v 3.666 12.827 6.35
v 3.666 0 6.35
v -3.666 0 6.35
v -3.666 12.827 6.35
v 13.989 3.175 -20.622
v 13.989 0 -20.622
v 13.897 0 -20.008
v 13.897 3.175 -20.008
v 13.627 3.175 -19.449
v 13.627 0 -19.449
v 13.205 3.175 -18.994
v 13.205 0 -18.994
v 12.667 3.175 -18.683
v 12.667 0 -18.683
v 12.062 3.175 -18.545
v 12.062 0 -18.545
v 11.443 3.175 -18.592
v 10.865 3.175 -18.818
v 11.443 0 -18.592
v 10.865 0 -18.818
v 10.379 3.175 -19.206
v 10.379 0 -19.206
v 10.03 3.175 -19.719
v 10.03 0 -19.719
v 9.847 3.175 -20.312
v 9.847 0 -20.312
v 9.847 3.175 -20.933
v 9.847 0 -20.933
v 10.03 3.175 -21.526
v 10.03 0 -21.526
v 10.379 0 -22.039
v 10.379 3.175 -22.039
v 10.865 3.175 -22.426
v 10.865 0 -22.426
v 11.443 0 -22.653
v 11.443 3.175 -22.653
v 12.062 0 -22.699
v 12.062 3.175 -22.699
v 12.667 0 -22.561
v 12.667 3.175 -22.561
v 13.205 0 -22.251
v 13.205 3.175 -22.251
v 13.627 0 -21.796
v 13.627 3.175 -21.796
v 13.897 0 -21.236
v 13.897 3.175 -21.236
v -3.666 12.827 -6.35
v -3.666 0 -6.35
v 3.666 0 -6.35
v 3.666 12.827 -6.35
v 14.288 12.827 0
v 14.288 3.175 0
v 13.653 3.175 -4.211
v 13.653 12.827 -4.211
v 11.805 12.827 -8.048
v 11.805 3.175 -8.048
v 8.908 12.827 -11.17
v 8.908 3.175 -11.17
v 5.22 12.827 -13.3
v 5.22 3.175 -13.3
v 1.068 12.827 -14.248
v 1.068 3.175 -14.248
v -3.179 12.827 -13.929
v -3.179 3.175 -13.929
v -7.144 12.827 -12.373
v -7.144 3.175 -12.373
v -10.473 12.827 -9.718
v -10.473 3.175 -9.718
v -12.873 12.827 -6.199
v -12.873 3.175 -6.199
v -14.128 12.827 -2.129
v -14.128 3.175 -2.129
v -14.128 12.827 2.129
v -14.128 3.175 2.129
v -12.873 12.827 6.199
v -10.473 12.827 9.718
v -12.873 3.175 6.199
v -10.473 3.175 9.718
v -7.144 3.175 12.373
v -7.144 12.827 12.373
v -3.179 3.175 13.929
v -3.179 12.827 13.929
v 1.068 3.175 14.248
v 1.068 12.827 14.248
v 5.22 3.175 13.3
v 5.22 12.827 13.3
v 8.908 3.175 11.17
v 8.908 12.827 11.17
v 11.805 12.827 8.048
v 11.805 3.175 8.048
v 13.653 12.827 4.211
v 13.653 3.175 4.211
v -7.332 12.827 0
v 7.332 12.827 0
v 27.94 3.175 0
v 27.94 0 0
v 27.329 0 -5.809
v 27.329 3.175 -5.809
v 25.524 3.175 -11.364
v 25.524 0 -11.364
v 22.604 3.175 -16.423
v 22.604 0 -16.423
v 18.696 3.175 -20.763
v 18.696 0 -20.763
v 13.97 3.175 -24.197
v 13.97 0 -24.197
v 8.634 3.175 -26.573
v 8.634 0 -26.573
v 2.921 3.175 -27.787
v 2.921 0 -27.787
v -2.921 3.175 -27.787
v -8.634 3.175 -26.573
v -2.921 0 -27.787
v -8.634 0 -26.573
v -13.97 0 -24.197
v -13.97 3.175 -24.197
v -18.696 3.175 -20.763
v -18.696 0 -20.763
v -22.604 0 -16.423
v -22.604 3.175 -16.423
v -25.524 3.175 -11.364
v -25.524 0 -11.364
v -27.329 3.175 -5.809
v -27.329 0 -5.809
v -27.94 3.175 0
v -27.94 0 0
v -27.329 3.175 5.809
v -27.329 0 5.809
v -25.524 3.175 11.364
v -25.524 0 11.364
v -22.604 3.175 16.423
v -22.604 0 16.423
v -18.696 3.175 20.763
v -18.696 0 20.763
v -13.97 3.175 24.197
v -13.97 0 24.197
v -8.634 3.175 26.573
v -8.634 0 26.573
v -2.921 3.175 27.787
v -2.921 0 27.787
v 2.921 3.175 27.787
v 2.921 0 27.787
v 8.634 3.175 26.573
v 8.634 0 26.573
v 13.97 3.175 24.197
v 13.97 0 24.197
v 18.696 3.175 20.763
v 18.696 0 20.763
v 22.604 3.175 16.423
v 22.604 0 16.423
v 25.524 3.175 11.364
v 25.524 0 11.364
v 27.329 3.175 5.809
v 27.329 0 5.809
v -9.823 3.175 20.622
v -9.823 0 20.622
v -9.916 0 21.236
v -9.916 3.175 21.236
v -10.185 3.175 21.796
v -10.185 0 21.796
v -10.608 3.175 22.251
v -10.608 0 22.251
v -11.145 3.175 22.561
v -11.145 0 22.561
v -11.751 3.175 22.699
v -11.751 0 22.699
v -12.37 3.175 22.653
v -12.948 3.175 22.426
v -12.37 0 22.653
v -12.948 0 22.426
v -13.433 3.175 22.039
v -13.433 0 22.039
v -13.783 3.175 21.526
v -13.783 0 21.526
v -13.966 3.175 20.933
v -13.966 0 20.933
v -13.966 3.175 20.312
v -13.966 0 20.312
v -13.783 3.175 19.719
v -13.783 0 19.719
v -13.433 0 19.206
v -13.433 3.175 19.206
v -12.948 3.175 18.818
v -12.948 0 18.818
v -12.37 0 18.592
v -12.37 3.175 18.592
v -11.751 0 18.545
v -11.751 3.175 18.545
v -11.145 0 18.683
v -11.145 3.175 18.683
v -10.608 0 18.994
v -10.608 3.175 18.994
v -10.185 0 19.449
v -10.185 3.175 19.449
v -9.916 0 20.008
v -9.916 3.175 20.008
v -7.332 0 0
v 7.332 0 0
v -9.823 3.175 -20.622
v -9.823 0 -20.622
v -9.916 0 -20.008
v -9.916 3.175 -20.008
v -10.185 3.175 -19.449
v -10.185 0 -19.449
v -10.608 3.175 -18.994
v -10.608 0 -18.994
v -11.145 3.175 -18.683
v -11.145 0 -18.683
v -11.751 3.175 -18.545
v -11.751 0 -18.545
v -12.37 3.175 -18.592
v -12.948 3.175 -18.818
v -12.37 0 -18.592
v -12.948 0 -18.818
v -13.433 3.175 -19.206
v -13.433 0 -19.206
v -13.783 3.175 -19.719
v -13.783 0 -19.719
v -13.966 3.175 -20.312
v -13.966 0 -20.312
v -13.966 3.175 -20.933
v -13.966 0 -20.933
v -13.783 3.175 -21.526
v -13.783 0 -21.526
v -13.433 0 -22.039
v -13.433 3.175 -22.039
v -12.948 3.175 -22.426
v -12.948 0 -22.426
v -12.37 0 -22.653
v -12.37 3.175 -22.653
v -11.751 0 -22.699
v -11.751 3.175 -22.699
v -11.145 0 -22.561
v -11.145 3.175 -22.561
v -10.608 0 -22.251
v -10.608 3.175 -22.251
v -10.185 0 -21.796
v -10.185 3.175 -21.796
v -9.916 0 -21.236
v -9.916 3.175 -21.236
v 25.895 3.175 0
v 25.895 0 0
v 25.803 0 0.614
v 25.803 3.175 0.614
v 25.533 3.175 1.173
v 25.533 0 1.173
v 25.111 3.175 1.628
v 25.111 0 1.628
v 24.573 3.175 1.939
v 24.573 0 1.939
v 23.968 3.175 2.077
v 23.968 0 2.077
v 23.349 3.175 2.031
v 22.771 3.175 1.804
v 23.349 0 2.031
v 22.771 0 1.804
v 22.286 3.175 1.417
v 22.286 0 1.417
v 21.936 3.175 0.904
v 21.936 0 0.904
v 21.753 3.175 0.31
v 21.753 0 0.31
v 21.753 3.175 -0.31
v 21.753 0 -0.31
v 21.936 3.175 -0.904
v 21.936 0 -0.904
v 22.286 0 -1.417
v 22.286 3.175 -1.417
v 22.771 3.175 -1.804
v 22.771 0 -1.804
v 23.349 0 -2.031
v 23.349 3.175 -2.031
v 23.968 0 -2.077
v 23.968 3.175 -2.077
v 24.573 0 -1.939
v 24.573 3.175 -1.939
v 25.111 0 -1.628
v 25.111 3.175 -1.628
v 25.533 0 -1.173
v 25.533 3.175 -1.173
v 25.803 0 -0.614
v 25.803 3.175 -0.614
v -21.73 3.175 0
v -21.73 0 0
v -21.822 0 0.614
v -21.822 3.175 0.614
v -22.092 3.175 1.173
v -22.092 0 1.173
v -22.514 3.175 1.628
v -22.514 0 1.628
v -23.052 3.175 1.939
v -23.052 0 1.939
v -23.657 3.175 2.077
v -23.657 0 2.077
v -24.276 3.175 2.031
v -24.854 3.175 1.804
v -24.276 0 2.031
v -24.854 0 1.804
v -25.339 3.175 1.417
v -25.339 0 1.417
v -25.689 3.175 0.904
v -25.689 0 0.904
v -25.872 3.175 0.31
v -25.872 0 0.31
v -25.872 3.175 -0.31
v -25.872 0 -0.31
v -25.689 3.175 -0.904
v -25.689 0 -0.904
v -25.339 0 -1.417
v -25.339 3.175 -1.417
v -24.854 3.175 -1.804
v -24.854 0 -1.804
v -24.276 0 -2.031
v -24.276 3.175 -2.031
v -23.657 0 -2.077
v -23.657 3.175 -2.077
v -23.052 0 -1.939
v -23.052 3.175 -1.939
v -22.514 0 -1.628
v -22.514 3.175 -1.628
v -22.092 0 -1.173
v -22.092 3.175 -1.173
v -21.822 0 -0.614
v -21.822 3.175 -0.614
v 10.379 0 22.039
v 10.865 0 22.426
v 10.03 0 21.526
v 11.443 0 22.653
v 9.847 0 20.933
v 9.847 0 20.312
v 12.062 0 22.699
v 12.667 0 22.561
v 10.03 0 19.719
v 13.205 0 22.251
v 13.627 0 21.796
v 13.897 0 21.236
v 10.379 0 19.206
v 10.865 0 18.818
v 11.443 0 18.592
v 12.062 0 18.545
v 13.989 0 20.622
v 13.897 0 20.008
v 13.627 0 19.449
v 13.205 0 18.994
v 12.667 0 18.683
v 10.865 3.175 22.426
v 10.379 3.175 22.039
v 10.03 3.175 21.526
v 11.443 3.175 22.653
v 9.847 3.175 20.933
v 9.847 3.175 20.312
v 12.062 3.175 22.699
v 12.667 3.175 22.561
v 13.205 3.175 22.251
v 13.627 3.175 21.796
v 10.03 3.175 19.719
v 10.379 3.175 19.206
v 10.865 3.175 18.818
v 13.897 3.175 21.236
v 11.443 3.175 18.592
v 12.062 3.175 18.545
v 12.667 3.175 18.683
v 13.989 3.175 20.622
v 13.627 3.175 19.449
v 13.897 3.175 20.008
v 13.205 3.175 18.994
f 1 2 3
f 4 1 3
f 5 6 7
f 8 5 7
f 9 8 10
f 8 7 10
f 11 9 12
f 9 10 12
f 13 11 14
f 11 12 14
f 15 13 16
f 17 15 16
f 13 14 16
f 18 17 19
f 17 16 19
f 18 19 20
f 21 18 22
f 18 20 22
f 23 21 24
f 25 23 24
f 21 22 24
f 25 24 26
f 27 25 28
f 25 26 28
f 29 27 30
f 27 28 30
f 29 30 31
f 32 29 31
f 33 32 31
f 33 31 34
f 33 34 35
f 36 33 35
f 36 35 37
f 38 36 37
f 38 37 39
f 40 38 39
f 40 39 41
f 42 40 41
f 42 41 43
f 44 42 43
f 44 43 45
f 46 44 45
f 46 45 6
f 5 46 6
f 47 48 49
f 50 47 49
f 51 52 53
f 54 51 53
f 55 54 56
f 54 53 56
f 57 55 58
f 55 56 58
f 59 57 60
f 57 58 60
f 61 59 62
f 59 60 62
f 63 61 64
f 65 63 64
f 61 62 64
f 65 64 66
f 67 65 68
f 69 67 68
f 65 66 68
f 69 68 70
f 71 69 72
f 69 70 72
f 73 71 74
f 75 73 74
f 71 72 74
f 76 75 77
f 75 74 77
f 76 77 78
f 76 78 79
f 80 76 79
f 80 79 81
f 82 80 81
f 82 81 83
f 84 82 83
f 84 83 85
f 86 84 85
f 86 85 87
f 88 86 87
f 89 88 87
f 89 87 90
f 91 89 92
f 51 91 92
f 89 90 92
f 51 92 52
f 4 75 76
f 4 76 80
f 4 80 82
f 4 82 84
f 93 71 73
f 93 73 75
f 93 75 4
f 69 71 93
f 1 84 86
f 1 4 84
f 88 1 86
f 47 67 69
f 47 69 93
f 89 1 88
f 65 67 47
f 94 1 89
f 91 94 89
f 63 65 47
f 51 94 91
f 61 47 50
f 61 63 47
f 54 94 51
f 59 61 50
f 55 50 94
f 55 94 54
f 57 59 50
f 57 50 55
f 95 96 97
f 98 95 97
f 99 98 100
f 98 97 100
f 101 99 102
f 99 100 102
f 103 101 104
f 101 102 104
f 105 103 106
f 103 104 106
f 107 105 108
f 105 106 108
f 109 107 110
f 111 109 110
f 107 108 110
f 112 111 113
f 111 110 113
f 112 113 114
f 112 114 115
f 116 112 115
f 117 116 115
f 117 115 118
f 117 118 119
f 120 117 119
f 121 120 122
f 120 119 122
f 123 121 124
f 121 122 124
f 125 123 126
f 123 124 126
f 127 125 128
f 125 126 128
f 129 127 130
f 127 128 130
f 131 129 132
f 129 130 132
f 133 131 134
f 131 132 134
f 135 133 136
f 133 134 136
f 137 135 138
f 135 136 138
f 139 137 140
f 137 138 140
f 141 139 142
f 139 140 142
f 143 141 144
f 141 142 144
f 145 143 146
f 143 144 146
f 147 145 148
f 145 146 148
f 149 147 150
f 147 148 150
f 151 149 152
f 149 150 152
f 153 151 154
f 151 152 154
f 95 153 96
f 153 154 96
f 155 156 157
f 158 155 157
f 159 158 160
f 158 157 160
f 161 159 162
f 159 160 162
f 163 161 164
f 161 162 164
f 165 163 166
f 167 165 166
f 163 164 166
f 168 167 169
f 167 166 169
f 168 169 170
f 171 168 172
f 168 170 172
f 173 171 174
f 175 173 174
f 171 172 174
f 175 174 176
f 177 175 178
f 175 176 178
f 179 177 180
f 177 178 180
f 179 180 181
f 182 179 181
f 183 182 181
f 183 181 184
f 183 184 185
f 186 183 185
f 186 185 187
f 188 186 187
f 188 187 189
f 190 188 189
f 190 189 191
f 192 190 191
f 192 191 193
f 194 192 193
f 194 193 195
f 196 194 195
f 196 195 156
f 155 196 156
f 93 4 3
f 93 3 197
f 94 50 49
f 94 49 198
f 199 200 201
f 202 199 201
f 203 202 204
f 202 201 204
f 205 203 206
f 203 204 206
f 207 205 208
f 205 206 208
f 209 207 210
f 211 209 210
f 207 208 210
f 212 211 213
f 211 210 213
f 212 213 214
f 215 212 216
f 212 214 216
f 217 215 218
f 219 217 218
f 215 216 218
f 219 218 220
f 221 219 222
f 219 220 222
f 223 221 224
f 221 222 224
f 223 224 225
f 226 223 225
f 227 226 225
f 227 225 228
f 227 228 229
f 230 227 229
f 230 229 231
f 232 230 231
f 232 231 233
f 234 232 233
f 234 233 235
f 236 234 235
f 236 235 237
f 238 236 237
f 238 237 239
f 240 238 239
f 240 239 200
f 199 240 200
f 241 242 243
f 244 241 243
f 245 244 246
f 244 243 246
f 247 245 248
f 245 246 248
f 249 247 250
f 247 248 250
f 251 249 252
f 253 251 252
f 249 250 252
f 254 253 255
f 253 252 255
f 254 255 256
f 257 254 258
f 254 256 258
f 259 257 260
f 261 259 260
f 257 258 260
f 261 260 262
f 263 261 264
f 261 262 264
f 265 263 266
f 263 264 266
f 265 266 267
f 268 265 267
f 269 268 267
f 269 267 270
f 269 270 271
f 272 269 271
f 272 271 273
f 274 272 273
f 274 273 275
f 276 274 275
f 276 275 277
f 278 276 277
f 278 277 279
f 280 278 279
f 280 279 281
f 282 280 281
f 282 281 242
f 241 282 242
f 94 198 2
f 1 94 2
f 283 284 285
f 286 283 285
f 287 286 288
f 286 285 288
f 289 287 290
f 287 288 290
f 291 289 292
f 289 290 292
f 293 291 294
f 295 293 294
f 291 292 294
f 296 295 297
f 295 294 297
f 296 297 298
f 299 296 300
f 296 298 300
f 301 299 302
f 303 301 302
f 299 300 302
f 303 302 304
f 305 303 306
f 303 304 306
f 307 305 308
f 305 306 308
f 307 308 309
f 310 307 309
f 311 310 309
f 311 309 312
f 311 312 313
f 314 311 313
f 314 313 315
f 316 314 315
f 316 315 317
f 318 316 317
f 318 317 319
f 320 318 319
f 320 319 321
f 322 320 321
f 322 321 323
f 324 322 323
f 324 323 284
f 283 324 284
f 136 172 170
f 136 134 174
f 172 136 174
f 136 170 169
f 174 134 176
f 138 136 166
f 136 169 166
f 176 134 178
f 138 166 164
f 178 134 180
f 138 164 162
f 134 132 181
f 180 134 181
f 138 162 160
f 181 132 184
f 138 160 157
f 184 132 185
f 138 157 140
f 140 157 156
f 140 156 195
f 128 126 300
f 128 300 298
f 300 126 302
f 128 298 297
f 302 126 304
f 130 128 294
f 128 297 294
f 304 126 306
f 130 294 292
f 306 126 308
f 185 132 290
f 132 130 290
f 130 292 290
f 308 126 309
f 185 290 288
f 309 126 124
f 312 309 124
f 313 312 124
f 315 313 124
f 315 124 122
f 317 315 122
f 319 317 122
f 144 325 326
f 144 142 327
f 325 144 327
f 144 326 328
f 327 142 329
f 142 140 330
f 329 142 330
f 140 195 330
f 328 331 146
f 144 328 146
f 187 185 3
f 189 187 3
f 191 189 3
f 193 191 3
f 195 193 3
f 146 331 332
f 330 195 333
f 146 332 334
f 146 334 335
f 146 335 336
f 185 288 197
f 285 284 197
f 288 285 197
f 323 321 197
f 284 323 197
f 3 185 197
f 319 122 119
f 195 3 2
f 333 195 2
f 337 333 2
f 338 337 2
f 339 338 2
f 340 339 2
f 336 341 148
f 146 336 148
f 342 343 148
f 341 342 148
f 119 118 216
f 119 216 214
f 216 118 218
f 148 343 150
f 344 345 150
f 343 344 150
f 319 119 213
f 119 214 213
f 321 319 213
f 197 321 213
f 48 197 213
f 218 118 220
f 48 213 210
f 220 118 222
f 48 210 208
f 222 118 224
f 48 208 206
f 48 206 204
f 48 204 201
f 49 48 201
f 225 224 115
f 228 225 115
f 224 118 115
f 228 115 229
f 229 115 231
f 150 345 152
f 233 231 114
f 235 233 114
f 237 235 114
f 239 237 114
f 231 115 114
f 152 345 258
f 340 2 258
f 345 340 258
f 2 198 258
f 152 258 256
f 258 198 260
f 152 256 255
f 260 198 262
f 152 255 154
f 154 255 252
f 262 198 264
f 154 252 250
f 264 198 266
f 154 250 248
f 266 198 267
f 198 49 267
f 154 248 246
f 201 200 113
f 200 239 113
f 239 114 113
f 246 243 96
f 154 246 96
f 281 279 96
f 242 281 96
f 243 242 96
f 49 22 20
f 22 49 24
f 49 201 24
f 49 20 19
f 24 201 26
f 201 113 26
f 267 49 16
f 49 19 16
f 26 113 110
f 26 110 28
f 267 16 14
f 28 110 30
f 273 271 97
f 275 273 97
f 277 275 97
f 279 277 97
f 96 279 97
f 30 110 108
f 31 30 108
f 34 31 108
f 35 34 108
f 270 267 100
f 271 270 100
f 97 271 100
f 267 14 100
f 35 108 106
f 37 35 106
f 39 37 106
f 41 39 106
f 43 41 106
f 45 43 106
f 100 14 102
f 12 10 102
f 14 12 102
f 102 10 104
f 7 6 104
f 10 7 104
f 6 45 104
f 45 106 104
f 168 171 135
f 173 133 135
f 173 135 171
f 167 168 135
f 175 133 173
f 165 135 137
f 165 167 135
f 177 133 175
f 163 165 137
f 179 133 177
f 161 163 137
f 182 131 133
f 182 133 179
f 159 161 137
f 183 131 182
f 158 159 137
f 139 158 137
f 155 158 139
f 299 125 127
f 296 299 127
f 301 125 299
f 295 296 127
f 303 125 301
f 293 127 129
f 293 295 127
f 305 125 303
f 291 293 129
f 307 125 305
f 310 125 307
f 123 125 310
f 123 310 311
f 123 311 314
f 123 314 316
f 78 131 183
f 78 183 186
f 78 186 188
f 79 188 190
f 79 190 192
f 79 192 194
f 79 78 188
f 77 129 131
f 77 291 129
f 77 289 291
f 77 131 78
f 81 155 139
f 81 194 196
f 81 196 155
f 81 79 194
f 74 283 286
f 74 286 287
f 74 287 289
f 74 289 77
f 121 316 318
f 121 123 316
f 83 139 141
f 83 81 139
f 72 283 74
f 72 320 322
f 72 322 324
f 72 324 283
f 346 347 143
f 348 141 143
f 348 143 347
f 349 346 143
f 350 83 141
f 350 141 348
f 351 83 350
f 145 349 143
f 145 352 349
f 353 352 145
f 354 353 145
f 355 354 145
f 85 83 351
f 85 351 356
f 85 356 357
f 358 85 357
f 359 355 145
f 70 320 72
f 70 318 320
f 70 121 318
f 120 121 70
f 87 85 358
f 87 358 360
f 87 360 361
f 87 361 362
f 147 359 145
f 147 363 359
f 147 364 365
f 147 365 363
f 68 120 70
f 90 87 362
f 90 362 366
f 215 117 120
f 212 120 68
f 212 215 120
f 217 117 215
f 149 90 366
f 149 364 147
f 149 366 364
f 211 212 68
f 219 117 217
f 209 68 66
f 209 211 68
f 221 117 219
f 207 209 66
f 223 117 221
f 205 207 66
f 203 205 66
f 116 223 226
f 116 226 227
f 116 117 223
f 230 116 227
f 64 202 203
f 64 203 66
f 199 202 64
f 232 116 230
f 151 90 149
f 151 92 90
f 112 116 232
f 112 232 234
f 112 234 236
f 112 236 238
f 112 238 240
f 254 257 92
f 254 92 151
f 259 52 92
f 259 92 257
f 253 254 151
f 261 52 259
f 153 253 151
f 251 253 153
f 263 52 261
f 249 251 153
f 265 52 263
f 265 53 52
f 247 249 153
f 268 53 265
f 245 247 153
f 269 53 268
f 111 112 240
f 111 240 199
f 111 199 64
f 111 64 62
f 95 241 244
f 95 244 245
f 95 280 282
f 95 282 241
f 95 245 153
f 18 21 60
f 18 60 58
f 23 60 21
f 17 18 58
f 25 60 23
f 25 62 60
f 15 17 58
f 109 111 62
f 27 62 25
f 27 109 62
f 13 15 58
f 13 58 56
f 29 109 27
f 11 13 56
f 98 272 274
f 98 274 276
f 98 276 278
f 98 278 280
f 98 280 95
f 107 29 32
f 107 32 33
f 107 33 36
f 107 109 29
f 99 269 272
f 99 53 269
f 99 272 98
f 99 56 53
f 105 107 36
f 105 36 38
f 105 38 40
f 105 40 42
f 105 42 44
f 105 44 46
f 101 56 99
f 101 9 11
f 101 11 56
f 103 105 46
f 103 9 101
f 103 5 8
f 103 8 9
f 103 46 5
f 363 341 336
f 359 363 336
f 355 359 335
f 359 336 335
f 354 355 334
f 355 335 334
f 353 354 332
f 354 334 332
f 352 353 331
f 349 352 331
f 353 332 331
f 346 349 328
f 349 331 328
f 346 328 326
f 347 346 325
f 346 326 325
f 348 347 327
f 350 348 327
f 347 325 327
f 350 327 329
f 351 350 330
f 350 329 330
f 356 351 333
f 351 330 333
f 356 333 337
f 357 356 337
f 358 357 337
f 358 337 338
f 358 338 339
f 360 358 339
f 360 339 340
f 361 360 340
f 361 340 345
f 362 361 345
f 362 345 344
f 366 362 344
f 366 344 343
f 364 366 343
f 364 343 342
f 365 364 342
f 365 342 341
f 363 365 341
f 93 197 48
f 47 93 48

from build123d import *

# Parameters (mm, degrees)
SKETCH1_R           = 27.94
BOSS_EXTRUDE1_DEPTH = 3.175
SKETCH2_R           = 14.2875
BOSS_EXTRUDE2_DEPTH = 9.652
CUT_EXTRUDE1_DEPTH  = 13.827
SKETCH4_R           = 2.0828
CUT_EXTRUDE2_DEPTH  = 13.827


with BuildPart() as part:
    # Sketch1 → Boss-Extrude1 (new body)
    with BuildSketch(Plane(origin=(0, 0, 0), x_dir=(1, 0, 0), z_dir=(0, 1, 0))):
        Circle(SKETCH1_R)
    extrude(amount=BOSS_EXTRUDE1_DEPTH)

    # Sketch2 → Boss-Extrude2 (add)
    with BuildSketch(Plane(origin=(0, 3.175, 0), x_dir=(1, 0, 0), z_dir=(0, 1, 0))):
        Circle(SKETCH2_R)
    extrude(amount=BOSS_EXTRUDE2_DEPTH)

    # Sketch3 → Cut-Extrude1 (cut, through all)
    with BuildSketch(Plane.XZ):
        Polygon((3.666174209, -6.35), (7.332348419, 0), (3.666174209, 6.35), (-3.666174209, 6.35), (-7.332348419, 0), (-3.666174209, -6.35), align=None)
    extrude(amount=-CUT_EXTRUDE1_DEPTH, mode=Mode.SUBTRACT)

    # Sketch4 → Cut-Extrude2 (cut, through all)
    with BuildSketch(Plane.XZ):
        with Locations((-11.90625, 20.622229928)):
            Circle(SKETCH4_R)
        with Locations((11.90625, 20.622229928)):
            Circle(SKETCH4_R)
        with Locations((23.8125, 0)):
            Circle(SKETCH4_R)
        with Locations((11.90625, -20.622229928)):
            Circle(SKETCH4_R)
        with Locations((-11.90625, -20.622229928)):
            Circle(SKETCH4_R)
        with Locations((-23.8125, 0)):
            Circle(SKETCH4_R)
    extrude(amount=-CUT_EXTRUDE2_DEPTH, mode=Mode.SUBTRACT)


solid = part.part
